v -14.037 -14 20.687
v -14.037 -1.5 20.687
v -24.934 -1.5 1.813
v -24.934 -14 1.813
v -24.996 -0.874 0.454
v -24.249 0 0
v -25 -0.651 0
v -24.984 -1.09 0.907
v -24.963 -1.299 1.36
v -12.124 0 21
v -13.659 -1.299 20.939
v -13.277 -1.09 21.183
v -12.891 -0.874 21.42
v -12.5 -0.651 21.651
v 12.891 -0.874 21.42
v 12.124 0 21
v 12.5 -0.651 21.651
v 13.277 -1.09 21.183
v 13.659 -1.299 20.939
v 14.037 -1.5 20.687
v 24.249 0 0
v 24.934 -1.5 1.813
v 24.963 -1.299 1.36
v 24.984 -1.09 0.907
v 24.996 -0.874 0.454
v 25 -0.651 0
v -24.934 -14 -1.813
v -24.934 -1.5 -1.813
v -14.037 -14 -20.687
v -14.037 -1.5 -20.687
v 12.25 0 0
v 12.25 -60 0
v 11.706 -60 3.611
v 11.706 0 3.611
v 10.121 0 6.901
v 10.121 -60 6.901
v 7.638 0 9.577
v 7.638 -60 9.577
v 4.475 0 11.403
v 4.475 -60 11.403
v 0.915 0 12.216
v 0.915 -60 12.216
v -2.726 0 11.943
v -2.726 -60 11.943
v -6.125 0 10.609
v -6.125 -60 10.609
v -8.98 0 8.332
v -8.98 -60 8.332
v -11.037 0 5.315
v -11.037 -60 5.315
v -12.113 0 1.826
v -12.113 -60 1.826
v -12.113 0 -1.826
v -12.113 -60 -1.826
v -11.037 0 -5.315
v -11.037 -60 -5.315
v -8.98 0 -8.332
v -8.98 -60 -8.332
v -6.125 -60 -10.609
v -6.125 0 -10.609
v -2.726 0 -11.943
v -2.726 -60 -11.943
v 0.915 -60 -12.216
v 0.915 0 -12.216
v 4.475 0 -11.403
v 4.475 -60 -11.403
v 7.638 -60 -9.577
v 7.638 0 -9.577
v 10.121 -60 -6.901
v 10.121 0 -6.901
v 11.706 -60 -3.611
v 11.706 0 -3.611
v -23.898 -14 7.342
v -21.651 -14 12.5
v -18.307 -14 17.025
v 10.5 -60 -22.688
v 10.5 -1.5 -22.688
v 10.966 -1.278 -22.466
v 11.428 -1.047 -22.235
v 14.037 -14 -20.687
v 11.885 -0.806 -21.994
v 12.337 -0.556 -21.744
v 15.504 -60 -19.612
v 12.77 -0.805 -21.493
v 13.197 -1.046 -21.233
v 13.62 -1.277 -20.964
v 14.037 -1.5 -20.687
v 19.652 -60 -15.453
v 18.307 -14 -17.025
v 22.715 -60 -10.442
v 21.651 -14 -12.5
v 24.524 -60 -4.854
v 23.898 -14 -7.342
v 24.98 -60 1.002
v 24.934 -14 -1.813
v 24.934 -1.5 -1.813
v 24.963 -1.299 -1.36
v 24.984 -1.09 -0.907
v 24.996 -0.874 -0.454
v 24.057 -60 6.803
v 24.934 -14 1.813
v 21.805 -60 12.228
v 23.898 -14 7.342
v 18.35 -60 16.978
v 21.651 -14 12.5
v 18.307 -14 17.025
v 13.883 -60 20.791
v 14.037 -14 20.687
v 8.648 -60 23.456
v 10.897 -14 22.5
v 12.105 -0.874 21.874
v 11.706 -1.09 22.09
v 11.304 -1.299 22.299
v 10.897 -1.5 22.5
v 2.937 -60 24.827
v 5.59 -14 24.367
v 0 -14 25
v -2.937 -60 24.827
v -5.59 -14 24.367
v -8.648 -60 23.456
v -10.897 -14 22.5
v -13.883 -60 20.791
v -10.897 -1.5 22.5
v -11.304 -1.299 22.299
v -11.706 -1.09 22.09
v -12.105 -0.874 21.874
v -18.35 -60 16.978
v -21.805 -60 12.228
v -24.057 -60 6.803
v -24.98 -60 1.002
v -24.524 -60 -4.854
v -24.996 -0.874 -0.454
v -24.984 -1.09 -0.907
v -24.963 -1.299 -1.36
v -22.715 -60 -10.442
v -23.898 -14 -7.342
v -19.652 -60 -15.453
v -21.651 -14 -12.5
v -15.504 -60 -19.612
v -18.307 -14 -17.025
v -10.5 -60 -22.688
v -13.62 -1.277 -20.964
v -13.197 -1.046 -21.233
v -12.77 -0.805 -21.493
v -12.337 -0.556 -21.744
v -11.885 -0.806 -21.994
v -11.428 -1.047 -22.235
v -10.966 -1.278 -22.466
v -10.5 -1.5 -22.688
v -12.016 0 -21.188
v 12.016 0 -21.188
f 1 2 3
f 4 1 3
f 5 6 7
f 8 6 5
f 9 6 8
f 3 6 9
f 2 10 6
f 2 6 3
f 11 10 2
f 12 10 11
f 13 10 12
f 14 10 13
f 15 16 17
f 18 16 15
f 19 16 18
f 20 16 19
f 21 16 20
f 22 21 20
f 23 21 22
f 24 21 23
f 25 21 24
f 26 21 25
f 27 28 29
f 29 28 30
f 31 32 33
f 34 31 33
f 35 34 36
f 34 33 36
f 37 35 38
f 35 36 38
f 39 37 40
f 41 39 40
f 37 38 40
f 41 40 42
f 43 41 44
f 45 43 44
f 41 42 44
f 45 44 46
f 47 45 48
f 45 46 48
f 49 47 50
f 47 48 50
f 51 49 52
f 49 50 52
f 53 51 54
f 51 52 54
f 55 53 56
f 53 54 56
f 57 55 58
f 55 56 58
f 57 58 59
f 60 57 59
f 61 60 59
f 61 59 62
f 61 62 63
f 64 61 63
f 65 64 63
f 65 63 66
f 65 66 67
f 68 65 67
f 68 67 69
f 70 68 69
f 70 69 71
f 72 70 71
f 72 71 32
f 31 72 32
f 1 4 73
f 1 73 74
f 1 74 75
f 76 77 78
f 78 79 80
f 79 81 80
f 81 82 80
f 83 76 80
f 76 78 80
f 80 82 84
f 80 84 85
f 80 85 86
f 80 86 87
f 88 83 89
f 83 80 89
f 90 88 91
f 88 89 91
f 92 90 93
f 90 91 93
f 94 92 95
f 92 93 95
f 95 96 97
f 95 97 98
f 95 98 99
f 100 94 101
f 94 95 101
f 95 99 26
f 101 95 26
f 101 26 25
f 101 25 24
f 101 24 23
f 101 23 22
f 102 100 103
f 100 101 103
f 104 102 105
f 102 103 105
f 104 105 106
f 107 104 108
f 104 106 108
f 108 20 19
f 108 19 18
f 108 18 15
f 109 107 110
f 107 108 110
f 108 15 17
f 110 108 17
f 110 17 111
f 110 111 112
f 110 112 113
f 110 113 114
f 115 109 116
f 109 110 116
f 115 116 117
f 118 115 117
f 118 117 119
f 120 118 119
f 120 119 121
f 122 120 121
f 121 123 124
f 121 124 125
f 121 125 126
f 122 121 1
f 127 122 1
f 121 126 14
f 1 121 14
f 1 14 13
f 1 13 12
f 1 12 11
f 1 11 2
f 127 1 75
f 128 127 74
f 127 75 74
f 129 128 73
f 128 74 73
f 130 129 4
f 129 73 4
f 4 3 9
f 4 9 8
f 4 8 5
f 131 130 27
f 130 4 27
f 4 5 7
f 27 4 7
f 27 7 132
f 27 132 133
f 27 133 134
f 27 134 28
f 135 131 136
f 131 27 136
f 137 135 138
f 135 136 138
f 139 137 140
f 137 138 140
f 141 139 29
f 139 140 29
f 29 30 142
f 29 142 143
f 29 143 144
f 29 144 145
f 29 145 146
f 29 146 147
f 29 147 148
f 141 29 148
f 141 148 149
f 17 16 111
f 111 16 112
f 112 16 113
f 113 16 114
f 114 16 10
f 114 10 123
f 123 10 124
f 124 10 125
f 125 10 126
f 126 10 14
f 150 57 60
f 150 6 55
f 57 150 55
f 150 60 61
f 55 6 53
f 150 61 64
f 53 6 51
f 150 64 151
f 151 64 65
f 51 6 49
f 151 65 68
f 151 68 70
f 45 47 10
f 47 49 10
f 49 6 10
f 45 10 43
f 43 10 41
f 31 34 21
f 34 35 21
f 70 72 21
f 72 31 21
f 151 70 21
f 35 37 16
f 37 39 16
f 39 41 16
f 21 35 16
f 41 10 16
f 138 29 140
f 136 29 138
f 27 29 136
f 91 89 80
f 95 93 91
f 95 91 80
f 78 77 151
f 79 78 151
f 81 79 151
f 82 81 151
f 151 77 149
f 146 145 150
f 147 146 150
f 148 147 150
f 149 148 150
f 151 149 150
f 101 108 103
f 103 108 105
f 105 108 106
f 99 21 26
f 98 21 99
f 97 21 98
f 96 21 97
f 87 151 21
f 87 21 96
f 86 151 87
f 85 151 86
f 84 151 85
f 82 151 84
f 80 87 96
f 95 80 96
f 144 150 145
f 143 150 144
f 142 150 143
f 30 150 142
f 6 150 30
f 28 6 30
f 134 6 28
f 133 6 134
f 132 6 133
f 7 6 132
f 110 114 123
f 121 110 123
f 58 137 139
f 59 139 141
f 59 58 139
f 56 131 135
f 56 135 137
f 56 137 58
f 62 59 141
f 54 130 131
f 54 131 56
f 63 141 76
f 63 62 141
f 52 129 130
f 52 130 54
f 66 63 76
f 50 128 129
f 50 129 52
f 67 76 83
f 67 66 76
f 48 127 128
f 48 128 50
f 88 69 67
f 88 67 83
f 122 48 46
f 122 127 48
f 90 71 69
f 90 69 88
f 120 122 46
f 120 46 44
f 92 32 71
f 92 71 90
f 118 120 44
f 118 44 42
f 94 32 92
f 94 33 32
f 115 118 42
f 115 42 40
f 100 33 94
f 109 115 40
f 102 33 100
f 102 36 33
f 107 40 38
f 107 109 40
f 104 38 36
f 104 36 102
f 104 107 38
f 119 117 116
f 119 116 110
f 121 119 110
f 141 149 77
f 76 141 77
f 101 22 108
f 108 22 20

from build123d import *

# Parameters (mm, degrees)
F1_DEPTH     = 60
F3_DEPTH     = 14
F4_D         = 24.5
F5_T1_DEPTH  = 29.5095436816
F5_T3_DEPTH  = 28.7150489639
F5_T5_DEPTH  = 29.5095436816
F5_T7_DEPTH  = 29.5095436816
F5_T9_DEPTH  = 29.5095436816
F5_T11_DEPTH = 29.5095436816


# Not quite as in the source:
# - a fillet or chamfer that OpenCascade refuses, or shapes differently, is made with other operations: its cross-section is extruded or revolved along the edge and cut away or added


with BuildPart() as f1:
    # F0 (on Front) → F1 (new body)
    with BuildSketch(Plane.XZ):
        with BuildLine():
            Line((-10.5, -22.6881026091), (10.5, -22.6881026091))
            ThreePointArc((10.5, -22.6881026091), (0, 25), (-10.5, -22.6881026091))
        make_face()
    extrude(amount=F1_DEPTH)

    # F2 (on face) → F3 (cut)
    with BuildSketch(Plane(origin=(0, 0, 0), x_dir=(-1, 0, 0), z_dir=(0, 1, 0))):
        with BuildLine():
            ThreePointArc((-24.9341952646, -1.8127069559), (-21.6506350946, -12.5), (-14.0369479057, -20.6872930441))
            Line((-14.0369479057, -20.6872930441), (-24.9341952646, -1.8127069559))
        make_face()
        with BuildLine():
            Line((-24.9341952646, 1.8127069559), (-14.0369479057, 20.6872930441))
            ThreePointArc((-14.0369479057, 20.6872930441), (-21.6506350946, 12.5), (-24.9341952646, 1.8127069559))
        make_face()
        with BuildLine():
            Line((-10.8972473589, 22.5), (10.8972473589, 22.5))
            ThreePointArc((10.8972473589, 22.5), (0, 25), (-10.8972473589, 22.5))
        make_face()
        with BuildLine():
            ThreePointArc((14.0369479057, -20.6872930441), (21.6506350946, -12.5), (24.9341952646, -1.8127069559))
            Line((24.9341952646, -1.8127069559), (14.0369479057, -20.6872930441))
        make_face()
        with BuildLine():
            Line((14.0369479057, 20.6872930441), (24.9341952646, 1.8127069559))
            ThreePointArc((24.9341952646, 1.8127069559), (21.6506350946, 12.5), (14.0369479057, 20.6872930441))
        make_face()
    extrude(amount=-F3_DEPTH, mode=Mode.SUBTRACT)

    # F4 (through all)
    with Locations(Plane(origin=(0, 0, 0), x_dir=(-1, 0, 0), z_dir=(0, 1, 0))):
        with Locations((0, 0)):
            Hole(F4_D / 2)

    # F5: chamfer of 1.5 on 6 edges, made by hand

    # F5_s2 → F5_t1 (cut)
    with BuildSketch(Plane(origin=(-7.3773859204, 0, -12.7780072412), x_dir=(0, 1, 0), z_dir=(0.5, 0, 0.8660254038))):
        Polygon((0, -21), (-1.5, -22.5), (0, -22.5), align=None)
    extrude(amount=F5_T1_DEPTH, mode=Mode.SUBTRACT)

    # F5_s4 → F5_t3 (cut)
    with BuildSketch(Plane.YZ.offset(-14.3575244819)):
        Polygon((-1.5, -22.6881026091), (0, -21.1881026091), (0, -22.6881026091), align=None)
    extrude(amount=F5_T3_DEPTH, mode=Mode.SUBTRACT)

    # F5_s6 → F5_t5 (cut)
    with BuildSketch(Plane(origin=(-7.3773859204, 0, 12.7780072412), x_dir=(0, 1, 0), z_dir=(0.5, 0, -0.8660254038))):
        Polygon((0, -21), (-1.5, -22.5), (0, -22.5), align=None)
    extrude(amount=F5_T5_DEPTH, mode=Mode.SUBTRACT)

    # F5_s8 → F5_t7 (cut)
    with BuildSketch(Plane(origin=(7.3773859204, 0, 12.7780072412), x_dir=(0, 1, 0), z_dir=(-0.5, 0, -0.8660254038))):
        Polygon((0, -21), (-1.5, -22.5), (0, -22.5), align=None)
    extrude(amount=F5_T7_DEPTH, mode=Mode.SUBTRACT)

    # F5_s10 → F5_t9 (cut)
    with BuildSketch(Plane.YZ.offset(-14.7547718408)):
        Polygon((0, 21), (-1.5, 22.5), (0, 22.5), align=None)
    extrude(amount=F5_T9_DEPTH, mode=Mode.SUBTRACT)

    # F5_s12 → F5_t11 (cut)
    with BuildSketch(Plane(origin=(7.3773859204, 0, -12.7780072412), x_dir=(0, 1, 0), z_dir=(-0.5, 0, 0.8660254038))):
        Polygon((0, -21), (-1.5, -22.5), (0, -22.5), align=None)
    extrude(amount=F5_T11_DEPTH, mode=Mode.SUBTRACT)


solid = f1.part
